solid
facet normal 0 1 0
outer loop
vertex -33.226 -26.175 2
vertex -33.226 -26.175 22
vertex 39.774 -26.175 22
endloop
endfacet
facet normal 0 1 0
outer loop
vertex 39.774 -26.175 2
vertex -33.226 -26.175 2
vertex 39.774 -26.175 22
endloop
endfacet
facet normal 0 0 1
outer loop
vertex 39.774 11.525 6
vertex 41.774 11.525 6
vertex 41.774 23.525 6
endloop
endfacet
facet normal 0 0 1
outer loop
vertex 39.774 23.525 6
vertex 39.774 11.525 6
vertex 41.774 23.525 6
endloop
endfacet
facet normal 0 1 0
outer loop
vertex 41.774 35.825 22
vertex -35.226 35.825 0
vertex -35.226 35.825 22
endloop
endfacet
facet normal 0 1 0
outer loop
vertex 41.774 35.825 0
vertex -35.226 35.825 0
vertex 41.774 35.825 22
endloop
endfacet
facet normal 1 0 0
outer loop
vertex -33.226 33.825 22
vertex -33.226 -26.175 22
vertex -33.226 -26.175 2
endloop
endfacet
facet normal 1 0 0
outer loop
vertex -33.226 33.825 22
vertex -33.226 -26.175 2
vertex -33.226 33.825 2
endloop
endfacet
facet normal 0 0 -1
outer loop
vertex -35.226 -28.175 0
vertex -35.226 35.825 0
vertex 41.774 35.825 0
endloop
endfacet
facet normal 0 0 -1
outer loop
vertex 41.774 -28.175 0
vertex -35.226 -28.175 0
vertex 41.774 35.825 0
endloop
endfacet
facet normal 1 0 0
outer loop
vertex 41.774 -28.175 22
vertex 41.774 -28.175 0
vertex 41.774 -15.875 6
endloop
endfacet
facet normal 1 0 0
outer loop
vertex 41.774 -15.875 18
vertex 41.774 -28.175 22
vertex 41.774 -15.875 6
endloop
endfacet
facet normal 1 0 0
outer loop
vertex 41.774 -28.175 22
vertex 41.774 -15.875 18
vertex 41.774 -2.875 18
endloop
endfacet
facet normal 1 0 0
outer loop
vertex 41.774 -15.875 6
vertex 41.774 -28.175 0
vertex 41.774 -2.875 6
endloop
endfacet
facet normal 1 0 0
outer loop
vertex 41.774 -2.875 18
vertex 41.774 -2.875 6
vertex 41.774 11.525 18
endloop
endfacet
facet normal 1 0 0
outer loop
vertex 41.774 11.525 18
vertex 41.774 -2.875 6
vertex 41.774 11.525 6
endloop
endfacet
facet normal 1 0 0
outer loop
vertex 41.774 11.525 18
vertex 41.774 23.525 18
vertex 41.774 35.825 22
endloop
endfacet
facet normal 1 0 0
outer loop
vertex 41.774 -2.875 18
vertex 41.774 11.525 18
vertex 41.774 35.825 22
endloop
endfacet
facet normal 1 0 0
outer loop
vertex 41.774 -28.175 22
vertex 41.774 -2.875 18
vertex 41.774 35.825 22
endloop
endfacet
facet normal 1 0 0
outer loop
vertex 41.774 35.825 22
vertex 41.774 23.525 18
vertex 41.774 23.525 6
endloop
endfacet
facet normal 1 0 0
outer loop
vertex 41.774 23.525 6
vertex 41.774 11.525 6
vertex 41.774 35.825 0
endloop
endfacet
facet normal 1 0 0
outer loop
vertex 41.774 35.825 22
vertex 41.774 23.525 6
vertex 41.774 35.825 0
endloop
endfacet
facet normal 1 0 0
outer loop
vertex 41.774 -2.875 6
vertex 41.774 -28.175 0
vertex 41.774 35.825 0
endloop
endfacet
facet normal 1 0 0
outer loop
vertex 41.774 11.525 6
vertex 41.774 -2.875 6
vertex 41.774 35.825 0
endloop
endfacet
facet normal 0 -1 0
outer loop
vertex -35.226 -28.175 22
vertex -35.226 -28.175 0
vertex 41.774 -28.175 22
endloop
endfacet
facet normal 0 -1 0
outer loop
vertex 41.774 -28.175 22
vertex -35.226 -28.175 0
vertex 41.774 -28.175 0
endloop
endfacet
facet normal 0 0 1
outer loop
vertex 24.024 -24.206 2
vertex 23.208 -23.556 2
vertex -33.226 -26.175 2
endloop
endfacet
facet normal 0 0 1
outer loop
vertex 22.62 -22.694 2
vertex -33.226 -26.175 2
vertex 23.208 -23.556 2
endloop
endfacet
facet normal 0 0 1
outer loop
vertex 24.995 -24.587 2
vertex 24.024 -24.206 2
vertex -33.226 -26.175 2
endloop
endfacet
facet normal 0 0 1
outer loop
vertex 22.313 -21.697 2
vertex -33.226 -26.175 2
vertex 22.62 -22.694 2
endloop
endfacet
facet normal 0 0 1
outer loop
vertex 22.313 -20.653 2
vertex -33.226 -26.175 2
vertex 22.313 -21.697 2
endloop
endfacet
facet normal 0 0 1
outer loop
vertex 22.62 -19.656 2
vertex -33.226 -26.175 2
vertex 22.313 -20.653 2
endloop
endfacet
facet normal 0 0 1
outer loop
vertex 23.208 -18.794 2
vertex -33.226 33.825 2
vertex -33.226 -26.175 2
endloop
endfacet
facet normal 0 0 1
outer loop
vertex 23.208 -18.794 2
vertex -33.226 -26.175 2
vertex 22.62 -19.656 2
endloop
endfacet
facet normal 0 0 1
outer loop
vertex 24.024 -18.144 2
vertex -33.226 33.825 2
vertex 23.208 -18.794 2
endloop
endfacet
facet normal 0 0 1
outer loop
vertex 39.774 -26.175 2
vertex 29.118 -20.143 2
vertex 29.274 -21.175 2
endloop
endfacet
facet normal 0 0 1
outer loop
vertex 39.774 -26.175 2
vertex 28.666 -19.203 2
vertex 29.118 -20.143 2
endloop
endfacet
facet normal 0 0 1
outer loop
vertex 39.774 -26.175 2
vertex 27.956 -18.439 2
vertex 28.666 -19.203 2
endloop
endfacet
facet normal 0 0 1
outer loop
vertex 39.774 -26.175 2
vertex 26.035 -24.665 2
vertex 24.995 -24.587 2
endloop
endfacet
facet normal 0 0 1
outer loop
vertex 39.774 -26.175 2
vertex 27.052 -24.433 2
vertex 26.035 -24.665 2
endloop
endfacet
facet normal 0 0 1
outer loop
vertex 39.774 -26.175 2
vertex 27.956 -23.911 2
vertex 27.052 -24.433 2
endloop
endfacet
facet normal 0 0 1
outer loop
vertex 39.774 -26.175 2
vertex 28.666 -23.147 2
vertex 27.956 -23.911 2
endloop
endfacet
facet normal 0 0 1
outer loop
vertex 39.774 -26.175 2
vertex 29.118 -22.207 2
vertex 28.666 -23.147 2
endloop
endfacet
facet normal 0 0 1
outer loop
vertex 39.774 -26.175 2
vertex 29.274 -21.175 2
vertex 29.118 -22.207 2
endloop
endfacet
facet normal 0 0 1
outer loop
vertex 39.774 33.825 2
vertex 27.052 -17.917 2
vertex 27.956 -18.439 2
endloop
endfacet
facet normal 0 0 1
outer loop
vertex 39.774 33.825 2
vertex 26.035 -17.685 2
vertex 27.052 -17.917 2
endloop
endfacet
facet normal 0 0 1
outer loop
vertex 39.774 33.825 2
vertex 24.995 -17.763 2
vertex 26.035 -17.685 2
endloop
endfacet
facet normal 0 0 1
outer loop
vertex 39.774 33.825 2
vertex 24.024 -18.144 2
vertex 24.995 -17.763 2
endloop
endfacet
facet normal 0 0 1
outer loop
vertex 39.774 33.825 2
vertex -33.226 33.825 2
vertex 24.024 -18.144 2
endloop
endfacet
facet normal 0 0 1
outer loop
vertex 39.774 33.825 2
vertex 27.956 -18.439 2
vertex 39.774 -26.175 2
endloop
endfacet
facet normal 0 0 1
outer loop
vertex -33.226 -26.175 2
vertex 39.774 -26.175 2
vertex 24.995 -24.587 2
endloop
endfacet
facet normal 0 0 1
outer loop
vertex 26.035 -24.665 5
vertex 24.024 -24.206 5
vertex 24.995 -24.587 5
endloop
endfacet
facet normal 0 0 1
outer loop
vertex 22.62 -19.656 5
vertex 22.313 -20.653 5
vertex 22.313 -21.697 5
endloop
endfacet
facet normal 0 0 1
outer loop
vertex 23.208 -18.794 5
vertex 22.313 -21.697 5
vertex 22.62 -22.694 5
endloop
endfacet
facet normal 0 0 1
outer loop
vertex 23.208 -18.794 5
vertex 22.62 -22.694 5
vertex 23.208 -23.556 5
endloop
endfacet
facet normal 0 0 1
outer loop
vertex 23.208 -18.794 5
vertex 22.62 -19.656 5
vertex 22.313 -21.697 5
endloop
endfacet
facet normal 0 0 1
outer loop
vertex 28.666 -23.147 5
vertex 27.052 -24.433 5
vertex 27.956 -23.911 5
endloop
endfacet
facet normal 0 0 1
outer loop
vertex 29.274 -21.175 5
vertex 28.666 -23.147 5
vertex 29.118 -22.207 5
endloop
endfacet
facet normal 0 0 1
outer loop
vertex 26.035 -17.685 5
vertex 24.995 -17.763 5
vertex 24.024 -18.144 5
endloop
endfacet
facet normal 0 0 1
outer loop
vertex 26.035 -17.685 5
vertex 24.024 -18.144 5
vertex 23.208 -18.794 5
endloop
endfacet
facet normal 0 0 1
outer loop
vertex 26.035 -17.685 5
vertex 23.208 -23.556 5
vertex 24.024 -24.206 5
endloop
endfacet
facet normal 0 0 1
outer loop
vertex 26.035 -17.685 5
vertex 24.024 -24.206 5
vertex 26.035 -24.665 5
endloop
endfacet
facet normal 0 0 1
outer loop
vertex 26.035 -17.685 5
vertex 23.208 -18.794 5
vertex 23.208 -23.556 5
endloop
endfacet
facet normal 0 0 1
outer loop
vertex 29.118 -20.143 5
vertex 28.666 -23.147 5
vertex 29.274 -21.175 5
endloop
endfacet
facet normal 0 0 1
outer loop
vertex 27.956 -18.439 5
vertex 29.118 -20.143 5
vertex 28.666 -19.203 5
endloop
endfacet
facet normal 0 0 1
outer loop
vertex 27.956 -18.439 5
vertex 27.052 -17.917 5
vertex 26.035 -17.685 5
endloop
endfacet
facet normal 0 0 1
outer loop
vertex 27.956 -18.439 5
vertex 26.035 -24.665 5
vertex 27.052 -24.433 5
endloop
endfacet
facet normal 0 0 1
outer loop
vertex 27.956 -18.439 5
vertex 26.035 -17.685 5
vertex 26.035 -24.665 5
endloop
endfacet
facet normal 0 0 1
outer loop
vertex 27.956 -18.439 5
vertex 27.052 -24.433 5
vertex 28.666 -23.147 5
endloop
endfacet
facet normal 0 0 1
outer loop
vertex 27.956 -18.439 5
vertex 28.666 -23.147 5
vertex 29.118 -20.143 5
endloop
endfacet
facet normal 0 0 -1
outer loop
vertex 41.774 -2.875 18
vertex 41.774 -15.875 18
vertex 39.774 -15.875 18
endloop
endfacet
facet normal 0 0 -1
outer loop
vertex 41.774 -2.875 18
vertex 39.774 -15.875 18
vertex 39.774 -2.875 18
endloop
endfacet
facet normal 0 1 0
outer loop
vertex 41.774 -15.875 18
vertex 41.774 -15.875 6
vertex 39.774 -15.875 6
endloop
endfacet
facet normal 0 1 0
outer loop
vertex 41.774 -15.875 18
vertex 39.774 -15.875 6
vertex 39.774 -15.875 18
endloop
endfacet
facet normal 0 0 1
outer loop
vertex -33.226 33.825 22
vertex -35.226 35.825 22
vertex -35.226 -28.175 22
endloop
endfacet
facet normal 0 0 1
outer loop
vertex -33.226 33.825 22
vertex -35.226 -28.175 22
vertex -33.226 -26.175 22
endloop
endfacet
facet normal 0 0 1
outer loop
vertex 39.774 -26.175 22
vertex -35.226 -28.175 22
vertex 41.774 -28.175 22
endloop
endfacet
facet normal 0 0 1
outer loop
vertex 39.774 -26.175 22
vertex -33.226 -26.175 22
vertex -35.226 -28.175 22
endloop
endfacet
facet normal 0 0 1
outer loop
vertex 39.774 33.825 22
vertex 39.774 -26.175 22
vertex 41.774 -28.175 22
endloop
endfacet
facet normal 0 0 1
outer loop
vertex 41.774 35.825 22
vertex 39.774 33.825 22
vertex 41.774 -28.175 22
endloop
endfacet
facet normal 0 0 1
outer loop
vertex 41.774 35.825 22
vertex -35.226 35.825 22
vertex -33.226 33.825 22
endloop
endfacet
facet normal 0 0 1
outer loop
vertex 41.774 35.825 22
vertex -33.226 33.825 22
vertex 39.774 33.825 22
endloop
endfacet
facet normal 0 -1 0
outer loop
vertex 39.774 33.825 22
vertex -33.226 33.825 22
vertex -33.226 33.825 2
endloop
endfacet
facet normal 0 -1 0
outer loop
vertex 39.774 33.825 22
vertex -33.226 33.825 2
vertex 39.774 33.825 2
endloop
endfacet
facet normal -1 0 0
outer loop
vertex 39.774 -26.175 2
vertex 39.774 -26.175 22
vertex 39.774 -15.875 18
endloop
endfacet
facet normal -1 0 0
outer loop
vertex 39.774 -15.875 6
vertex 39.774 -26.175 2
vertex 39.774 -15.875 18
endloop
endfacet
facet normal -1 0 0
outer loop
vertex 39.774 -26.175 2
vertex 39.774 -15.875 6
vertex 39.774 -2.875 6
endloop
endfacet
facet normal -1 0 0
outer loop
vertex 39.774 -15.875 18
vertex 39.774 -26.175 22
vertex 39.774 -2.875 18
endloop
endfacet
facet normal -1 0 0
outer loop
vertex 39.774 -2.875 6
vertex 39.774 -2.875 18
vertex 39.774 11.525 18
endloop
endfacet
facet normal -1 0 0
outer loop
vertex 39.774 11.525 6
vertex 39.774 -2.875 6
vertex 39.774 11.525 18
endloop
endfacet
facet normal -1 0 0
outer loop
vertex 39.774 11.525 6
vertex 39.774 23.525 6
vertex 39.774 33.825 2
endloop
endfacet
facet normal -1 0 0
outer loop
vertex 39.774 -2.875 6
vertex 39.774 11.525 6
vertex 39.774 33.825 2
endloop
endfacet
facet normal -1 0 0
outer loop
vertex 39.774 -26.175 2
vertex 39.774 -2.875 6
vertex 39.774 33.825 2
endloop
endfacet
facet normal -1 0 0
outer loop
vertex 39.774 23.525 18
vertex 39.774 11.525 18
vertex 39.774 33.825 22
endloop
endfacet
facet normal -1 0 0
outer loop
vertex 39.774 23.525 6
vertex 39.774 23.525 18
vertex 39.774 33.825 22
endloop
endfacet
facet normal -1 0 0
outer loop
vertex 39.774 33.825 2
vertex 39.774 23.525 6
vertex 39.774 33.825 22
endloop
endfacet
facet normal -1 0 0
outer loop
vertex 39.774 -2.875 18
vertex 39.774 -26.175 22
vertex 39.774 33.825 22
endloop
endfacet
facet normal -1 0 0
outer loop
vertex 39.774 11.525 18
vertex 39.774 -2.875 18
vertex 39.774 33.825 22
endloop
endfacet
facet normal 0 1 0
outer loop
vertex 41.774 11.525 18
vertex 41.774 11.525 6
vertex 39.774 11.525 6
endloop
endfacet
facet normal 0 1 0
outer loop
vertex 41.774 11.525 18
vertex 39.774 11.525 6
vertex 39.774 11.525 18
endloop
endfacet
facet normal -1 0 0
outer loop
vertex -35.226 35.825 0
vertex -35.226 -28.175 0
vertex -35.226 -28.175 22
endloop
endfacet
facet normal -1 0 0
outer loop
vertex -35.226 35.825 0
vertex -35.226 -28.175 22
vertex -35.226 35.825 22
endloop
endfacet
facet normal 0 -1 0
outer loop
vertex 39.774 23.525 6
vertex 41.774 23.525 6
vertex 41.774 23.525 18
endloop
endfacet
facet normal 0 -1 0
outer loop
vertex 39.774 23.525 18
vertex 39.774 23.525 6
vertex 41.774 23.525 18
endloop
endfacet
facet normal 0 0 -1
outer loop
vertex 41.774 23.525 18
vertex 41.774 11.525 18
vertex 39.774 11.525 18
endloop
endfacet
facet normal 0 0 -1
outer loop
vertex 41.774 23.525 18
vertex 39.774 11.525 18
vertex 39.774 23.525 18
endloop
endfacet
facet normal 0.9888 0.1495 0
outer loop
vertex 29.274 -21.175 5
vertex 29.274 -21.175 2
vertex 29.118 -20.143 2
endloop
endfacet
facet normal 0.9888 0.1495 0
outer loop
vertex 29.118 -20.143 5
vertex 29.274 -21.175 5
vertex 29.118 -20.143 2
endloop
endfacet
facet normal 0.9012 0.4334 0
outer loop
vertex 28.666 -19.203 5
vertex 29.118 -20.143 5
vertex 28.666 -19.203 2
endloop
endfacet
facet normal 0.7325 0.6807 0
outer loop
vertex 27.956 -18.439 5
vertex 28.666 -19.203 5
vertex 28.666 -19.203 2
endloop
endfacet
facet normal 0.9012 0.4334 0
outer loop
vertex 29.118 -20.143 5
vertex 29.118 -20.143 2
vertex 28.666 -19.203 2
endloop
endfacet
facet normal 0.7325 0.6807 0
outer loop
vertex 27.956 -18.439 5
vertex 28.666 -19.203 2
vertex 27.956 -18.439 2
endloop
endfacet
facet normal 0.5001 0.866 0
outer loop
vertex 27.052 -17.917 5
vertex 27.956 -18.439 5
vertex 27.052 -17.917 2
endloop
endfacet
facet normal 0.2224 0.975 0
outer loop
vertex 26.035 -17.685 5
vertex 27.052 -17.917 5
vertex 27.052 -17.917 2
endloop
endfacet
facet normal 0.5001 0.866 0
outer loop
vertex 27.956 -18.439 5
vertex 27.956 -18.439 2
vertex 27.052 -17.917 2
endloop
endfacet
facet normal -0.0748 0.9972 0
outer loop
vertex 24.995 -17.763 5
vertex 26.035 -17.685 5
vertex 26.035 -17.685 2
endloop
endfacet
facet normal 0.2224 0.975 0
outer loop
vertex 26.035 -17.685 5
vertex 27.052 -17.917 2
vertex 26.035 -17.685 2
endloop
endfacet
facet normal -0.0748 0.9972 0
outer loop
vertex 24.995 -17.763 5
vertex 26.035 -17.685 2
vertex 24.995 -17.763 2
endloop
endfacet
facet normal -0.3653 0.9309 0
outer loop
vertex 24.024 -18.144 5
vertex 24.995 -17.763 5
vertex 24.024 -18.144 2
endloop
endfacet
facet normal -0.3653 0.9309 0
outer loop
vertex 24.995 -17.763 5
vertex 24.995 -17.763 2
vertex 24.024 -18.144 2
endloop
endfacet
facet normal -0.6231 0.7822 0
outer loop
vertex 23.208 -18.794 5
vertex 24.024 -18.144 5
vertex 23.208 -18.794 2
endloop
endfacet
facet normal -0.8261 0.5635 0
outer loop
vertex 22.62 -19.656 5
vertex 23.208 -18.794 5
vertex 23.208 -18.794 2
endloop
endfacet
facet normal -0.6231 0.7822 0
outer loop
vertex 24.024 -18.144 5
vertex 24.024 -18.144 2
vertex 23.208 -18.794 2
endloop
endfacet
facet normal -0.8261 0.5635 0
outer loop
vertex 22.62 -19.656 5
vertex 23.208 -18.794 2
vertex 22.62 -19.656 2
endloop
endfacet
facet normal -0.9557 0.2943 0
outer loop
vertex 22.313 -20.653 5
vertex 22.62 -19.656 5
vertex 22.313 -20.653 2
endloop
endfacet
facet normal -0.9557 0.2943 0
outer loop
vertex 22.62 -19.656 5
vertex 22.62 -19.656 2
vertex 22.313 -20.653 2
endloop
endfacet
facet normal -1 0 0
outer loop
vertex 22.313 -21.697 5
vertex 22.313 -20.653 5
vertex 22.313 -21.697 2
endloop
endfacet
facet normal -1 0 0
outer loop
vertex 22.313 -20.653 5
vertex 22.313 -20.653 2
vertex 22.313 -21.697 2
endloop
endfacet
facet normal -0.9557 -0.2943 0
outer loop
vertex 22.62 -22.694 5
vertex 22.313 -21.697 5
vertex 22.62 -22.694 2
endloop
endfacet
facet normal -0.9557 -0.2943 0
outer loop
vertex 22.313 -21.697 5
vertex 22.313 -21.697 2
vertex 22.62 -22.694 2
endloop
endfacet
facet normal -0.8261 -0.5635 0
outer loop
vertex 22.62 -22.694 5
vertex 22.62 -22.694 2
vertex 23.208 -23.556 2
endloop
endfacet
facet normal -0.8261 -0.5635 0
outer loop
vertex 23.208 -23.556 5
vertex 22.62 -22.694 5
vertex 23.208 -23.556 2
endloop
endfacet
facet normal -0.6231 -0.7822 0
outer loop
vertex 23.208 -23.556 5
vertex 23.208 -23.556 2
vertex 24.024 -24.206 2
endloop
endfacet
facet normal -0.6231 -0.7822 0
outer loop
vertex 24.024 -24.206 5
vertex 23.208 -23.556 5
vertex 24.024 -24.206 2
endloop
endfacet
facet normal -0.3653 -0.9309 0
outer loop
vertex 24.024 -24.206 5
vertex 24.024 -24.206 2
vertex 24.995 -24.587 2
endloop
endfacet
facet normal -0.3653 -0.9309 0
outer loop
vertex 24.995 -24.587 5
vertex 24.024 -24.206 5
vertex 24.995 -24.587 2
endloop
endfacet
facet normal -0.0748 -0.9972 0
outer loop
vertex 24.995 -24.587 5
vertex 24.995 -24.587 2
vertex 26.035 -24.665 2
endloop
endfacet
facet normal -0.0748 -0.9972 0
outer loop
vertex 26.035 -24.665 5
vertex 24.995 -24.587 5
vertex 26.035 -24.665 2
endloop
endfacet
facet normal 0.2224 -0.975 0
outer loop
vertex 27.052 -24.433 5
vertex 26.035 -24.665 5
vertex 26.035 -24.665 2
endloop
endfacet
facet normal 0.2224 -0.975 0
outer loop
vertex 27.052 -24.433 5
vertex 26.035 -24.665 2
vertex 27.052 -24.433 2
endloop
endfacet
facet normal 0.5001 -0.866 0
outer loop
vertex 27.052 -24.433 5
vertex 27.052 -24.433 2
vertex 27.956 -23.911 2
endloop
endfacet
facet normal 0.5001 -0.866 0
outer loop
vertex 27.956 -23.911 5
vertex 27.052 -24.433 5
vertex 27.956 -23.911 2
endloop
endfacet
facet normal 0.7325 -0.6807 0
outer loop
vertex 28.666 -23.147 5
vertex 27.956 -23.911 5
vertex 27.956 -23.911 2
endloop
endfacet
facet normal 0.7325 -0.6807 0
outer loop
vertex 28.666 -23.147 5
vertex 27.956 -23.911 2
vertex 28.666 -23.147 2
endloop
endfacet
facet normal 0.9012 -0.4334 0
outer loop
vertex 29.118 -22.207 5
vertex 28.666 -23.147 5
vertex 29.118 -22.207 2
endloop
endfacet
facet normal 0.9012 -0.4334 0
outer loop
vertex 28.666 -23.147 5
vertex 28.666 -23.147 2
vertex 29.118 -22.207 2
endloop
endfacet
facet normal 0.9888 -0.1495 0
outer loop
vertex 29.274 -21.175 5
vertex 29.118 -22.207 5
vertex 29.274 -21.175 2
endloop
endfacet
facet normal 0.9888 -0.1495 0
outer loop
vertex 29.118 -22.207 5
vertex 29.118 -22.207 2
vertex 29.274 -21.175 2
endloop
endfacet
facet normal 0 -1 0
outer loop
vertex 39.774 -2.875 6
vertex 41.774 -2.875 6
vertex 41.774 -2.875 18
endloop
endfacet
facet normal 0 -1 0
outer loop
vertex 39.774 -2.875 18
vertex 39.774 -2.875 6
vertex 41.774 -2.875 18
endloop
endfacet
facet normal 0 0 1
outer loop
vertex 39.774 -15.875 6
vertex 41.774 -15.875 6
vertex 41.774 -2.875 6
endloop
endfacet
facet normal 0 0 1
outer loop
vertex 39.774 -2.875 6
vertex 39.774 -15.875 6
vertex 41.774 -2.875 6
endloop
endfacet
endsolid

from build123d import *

# Parameters (mm, degrees)
F2_W      = 77
F2_H      = 64
F3_DEPTH  = 22
F4_W      = 73
F4_H      = 60
F5_DEPTH  = 20
F6_W      = 13
F6_H      = 12
F8_DEPTH  = 2
F7_W      = 12
F7_H      = 12
F9_DEPTH  = 2
F10_R     = 3.5
F11_DEPTH = 3


with BuildPart() as f3:
    # F2 (on Top) → F3 (new body)
    with BuildSketch(Plane.XY):
        with Locations((3.2737072408, 3.8249654726)):
            Rectangle(F2_W, F2_H)
    extrude(amount=F3_DEPTH)

    # F4 (on face) → F5 (cut)
    with BuildSketch(Plane.XY.offset(22)):
        with Locations((3.2737072408, 3.8249654726)):
            Rectangle(F4_W, F4_H)
    extrude(amount=-F5_DEPTH, mode=Mode.SUBTRACT)

    # F6 (on face) → F8 (cut)
    with BuildSketch(Plane.YZ.offset(41.7737072408)):
        with Locations((-9.3750345274, 12)):
            Rectangle(F6_W, F6_H)
    extrude(amount=-F8_DEPTH, mode=Mode.SUBTRACT)

    # F7 (on face) → F9 (cut)
    with BuildSketch(Plane.YZ.offset(41.7737072408)):
        with Locations((17.5249654726, 12)):
            Rectangle(F7_W, F7_H)
    extrude(amount=-F9_DEPTH, mode=Mode.SUBTRACT)

    # F10 (on face) → F11 (join)
    with BuildSketch(Plane.XY.offset(2)):
        with Locations((25.7737072408, -21.1750345274)):
            Circle(F10_R)
    extrude(amount=F11_DEPTH)


solid = f3.part
